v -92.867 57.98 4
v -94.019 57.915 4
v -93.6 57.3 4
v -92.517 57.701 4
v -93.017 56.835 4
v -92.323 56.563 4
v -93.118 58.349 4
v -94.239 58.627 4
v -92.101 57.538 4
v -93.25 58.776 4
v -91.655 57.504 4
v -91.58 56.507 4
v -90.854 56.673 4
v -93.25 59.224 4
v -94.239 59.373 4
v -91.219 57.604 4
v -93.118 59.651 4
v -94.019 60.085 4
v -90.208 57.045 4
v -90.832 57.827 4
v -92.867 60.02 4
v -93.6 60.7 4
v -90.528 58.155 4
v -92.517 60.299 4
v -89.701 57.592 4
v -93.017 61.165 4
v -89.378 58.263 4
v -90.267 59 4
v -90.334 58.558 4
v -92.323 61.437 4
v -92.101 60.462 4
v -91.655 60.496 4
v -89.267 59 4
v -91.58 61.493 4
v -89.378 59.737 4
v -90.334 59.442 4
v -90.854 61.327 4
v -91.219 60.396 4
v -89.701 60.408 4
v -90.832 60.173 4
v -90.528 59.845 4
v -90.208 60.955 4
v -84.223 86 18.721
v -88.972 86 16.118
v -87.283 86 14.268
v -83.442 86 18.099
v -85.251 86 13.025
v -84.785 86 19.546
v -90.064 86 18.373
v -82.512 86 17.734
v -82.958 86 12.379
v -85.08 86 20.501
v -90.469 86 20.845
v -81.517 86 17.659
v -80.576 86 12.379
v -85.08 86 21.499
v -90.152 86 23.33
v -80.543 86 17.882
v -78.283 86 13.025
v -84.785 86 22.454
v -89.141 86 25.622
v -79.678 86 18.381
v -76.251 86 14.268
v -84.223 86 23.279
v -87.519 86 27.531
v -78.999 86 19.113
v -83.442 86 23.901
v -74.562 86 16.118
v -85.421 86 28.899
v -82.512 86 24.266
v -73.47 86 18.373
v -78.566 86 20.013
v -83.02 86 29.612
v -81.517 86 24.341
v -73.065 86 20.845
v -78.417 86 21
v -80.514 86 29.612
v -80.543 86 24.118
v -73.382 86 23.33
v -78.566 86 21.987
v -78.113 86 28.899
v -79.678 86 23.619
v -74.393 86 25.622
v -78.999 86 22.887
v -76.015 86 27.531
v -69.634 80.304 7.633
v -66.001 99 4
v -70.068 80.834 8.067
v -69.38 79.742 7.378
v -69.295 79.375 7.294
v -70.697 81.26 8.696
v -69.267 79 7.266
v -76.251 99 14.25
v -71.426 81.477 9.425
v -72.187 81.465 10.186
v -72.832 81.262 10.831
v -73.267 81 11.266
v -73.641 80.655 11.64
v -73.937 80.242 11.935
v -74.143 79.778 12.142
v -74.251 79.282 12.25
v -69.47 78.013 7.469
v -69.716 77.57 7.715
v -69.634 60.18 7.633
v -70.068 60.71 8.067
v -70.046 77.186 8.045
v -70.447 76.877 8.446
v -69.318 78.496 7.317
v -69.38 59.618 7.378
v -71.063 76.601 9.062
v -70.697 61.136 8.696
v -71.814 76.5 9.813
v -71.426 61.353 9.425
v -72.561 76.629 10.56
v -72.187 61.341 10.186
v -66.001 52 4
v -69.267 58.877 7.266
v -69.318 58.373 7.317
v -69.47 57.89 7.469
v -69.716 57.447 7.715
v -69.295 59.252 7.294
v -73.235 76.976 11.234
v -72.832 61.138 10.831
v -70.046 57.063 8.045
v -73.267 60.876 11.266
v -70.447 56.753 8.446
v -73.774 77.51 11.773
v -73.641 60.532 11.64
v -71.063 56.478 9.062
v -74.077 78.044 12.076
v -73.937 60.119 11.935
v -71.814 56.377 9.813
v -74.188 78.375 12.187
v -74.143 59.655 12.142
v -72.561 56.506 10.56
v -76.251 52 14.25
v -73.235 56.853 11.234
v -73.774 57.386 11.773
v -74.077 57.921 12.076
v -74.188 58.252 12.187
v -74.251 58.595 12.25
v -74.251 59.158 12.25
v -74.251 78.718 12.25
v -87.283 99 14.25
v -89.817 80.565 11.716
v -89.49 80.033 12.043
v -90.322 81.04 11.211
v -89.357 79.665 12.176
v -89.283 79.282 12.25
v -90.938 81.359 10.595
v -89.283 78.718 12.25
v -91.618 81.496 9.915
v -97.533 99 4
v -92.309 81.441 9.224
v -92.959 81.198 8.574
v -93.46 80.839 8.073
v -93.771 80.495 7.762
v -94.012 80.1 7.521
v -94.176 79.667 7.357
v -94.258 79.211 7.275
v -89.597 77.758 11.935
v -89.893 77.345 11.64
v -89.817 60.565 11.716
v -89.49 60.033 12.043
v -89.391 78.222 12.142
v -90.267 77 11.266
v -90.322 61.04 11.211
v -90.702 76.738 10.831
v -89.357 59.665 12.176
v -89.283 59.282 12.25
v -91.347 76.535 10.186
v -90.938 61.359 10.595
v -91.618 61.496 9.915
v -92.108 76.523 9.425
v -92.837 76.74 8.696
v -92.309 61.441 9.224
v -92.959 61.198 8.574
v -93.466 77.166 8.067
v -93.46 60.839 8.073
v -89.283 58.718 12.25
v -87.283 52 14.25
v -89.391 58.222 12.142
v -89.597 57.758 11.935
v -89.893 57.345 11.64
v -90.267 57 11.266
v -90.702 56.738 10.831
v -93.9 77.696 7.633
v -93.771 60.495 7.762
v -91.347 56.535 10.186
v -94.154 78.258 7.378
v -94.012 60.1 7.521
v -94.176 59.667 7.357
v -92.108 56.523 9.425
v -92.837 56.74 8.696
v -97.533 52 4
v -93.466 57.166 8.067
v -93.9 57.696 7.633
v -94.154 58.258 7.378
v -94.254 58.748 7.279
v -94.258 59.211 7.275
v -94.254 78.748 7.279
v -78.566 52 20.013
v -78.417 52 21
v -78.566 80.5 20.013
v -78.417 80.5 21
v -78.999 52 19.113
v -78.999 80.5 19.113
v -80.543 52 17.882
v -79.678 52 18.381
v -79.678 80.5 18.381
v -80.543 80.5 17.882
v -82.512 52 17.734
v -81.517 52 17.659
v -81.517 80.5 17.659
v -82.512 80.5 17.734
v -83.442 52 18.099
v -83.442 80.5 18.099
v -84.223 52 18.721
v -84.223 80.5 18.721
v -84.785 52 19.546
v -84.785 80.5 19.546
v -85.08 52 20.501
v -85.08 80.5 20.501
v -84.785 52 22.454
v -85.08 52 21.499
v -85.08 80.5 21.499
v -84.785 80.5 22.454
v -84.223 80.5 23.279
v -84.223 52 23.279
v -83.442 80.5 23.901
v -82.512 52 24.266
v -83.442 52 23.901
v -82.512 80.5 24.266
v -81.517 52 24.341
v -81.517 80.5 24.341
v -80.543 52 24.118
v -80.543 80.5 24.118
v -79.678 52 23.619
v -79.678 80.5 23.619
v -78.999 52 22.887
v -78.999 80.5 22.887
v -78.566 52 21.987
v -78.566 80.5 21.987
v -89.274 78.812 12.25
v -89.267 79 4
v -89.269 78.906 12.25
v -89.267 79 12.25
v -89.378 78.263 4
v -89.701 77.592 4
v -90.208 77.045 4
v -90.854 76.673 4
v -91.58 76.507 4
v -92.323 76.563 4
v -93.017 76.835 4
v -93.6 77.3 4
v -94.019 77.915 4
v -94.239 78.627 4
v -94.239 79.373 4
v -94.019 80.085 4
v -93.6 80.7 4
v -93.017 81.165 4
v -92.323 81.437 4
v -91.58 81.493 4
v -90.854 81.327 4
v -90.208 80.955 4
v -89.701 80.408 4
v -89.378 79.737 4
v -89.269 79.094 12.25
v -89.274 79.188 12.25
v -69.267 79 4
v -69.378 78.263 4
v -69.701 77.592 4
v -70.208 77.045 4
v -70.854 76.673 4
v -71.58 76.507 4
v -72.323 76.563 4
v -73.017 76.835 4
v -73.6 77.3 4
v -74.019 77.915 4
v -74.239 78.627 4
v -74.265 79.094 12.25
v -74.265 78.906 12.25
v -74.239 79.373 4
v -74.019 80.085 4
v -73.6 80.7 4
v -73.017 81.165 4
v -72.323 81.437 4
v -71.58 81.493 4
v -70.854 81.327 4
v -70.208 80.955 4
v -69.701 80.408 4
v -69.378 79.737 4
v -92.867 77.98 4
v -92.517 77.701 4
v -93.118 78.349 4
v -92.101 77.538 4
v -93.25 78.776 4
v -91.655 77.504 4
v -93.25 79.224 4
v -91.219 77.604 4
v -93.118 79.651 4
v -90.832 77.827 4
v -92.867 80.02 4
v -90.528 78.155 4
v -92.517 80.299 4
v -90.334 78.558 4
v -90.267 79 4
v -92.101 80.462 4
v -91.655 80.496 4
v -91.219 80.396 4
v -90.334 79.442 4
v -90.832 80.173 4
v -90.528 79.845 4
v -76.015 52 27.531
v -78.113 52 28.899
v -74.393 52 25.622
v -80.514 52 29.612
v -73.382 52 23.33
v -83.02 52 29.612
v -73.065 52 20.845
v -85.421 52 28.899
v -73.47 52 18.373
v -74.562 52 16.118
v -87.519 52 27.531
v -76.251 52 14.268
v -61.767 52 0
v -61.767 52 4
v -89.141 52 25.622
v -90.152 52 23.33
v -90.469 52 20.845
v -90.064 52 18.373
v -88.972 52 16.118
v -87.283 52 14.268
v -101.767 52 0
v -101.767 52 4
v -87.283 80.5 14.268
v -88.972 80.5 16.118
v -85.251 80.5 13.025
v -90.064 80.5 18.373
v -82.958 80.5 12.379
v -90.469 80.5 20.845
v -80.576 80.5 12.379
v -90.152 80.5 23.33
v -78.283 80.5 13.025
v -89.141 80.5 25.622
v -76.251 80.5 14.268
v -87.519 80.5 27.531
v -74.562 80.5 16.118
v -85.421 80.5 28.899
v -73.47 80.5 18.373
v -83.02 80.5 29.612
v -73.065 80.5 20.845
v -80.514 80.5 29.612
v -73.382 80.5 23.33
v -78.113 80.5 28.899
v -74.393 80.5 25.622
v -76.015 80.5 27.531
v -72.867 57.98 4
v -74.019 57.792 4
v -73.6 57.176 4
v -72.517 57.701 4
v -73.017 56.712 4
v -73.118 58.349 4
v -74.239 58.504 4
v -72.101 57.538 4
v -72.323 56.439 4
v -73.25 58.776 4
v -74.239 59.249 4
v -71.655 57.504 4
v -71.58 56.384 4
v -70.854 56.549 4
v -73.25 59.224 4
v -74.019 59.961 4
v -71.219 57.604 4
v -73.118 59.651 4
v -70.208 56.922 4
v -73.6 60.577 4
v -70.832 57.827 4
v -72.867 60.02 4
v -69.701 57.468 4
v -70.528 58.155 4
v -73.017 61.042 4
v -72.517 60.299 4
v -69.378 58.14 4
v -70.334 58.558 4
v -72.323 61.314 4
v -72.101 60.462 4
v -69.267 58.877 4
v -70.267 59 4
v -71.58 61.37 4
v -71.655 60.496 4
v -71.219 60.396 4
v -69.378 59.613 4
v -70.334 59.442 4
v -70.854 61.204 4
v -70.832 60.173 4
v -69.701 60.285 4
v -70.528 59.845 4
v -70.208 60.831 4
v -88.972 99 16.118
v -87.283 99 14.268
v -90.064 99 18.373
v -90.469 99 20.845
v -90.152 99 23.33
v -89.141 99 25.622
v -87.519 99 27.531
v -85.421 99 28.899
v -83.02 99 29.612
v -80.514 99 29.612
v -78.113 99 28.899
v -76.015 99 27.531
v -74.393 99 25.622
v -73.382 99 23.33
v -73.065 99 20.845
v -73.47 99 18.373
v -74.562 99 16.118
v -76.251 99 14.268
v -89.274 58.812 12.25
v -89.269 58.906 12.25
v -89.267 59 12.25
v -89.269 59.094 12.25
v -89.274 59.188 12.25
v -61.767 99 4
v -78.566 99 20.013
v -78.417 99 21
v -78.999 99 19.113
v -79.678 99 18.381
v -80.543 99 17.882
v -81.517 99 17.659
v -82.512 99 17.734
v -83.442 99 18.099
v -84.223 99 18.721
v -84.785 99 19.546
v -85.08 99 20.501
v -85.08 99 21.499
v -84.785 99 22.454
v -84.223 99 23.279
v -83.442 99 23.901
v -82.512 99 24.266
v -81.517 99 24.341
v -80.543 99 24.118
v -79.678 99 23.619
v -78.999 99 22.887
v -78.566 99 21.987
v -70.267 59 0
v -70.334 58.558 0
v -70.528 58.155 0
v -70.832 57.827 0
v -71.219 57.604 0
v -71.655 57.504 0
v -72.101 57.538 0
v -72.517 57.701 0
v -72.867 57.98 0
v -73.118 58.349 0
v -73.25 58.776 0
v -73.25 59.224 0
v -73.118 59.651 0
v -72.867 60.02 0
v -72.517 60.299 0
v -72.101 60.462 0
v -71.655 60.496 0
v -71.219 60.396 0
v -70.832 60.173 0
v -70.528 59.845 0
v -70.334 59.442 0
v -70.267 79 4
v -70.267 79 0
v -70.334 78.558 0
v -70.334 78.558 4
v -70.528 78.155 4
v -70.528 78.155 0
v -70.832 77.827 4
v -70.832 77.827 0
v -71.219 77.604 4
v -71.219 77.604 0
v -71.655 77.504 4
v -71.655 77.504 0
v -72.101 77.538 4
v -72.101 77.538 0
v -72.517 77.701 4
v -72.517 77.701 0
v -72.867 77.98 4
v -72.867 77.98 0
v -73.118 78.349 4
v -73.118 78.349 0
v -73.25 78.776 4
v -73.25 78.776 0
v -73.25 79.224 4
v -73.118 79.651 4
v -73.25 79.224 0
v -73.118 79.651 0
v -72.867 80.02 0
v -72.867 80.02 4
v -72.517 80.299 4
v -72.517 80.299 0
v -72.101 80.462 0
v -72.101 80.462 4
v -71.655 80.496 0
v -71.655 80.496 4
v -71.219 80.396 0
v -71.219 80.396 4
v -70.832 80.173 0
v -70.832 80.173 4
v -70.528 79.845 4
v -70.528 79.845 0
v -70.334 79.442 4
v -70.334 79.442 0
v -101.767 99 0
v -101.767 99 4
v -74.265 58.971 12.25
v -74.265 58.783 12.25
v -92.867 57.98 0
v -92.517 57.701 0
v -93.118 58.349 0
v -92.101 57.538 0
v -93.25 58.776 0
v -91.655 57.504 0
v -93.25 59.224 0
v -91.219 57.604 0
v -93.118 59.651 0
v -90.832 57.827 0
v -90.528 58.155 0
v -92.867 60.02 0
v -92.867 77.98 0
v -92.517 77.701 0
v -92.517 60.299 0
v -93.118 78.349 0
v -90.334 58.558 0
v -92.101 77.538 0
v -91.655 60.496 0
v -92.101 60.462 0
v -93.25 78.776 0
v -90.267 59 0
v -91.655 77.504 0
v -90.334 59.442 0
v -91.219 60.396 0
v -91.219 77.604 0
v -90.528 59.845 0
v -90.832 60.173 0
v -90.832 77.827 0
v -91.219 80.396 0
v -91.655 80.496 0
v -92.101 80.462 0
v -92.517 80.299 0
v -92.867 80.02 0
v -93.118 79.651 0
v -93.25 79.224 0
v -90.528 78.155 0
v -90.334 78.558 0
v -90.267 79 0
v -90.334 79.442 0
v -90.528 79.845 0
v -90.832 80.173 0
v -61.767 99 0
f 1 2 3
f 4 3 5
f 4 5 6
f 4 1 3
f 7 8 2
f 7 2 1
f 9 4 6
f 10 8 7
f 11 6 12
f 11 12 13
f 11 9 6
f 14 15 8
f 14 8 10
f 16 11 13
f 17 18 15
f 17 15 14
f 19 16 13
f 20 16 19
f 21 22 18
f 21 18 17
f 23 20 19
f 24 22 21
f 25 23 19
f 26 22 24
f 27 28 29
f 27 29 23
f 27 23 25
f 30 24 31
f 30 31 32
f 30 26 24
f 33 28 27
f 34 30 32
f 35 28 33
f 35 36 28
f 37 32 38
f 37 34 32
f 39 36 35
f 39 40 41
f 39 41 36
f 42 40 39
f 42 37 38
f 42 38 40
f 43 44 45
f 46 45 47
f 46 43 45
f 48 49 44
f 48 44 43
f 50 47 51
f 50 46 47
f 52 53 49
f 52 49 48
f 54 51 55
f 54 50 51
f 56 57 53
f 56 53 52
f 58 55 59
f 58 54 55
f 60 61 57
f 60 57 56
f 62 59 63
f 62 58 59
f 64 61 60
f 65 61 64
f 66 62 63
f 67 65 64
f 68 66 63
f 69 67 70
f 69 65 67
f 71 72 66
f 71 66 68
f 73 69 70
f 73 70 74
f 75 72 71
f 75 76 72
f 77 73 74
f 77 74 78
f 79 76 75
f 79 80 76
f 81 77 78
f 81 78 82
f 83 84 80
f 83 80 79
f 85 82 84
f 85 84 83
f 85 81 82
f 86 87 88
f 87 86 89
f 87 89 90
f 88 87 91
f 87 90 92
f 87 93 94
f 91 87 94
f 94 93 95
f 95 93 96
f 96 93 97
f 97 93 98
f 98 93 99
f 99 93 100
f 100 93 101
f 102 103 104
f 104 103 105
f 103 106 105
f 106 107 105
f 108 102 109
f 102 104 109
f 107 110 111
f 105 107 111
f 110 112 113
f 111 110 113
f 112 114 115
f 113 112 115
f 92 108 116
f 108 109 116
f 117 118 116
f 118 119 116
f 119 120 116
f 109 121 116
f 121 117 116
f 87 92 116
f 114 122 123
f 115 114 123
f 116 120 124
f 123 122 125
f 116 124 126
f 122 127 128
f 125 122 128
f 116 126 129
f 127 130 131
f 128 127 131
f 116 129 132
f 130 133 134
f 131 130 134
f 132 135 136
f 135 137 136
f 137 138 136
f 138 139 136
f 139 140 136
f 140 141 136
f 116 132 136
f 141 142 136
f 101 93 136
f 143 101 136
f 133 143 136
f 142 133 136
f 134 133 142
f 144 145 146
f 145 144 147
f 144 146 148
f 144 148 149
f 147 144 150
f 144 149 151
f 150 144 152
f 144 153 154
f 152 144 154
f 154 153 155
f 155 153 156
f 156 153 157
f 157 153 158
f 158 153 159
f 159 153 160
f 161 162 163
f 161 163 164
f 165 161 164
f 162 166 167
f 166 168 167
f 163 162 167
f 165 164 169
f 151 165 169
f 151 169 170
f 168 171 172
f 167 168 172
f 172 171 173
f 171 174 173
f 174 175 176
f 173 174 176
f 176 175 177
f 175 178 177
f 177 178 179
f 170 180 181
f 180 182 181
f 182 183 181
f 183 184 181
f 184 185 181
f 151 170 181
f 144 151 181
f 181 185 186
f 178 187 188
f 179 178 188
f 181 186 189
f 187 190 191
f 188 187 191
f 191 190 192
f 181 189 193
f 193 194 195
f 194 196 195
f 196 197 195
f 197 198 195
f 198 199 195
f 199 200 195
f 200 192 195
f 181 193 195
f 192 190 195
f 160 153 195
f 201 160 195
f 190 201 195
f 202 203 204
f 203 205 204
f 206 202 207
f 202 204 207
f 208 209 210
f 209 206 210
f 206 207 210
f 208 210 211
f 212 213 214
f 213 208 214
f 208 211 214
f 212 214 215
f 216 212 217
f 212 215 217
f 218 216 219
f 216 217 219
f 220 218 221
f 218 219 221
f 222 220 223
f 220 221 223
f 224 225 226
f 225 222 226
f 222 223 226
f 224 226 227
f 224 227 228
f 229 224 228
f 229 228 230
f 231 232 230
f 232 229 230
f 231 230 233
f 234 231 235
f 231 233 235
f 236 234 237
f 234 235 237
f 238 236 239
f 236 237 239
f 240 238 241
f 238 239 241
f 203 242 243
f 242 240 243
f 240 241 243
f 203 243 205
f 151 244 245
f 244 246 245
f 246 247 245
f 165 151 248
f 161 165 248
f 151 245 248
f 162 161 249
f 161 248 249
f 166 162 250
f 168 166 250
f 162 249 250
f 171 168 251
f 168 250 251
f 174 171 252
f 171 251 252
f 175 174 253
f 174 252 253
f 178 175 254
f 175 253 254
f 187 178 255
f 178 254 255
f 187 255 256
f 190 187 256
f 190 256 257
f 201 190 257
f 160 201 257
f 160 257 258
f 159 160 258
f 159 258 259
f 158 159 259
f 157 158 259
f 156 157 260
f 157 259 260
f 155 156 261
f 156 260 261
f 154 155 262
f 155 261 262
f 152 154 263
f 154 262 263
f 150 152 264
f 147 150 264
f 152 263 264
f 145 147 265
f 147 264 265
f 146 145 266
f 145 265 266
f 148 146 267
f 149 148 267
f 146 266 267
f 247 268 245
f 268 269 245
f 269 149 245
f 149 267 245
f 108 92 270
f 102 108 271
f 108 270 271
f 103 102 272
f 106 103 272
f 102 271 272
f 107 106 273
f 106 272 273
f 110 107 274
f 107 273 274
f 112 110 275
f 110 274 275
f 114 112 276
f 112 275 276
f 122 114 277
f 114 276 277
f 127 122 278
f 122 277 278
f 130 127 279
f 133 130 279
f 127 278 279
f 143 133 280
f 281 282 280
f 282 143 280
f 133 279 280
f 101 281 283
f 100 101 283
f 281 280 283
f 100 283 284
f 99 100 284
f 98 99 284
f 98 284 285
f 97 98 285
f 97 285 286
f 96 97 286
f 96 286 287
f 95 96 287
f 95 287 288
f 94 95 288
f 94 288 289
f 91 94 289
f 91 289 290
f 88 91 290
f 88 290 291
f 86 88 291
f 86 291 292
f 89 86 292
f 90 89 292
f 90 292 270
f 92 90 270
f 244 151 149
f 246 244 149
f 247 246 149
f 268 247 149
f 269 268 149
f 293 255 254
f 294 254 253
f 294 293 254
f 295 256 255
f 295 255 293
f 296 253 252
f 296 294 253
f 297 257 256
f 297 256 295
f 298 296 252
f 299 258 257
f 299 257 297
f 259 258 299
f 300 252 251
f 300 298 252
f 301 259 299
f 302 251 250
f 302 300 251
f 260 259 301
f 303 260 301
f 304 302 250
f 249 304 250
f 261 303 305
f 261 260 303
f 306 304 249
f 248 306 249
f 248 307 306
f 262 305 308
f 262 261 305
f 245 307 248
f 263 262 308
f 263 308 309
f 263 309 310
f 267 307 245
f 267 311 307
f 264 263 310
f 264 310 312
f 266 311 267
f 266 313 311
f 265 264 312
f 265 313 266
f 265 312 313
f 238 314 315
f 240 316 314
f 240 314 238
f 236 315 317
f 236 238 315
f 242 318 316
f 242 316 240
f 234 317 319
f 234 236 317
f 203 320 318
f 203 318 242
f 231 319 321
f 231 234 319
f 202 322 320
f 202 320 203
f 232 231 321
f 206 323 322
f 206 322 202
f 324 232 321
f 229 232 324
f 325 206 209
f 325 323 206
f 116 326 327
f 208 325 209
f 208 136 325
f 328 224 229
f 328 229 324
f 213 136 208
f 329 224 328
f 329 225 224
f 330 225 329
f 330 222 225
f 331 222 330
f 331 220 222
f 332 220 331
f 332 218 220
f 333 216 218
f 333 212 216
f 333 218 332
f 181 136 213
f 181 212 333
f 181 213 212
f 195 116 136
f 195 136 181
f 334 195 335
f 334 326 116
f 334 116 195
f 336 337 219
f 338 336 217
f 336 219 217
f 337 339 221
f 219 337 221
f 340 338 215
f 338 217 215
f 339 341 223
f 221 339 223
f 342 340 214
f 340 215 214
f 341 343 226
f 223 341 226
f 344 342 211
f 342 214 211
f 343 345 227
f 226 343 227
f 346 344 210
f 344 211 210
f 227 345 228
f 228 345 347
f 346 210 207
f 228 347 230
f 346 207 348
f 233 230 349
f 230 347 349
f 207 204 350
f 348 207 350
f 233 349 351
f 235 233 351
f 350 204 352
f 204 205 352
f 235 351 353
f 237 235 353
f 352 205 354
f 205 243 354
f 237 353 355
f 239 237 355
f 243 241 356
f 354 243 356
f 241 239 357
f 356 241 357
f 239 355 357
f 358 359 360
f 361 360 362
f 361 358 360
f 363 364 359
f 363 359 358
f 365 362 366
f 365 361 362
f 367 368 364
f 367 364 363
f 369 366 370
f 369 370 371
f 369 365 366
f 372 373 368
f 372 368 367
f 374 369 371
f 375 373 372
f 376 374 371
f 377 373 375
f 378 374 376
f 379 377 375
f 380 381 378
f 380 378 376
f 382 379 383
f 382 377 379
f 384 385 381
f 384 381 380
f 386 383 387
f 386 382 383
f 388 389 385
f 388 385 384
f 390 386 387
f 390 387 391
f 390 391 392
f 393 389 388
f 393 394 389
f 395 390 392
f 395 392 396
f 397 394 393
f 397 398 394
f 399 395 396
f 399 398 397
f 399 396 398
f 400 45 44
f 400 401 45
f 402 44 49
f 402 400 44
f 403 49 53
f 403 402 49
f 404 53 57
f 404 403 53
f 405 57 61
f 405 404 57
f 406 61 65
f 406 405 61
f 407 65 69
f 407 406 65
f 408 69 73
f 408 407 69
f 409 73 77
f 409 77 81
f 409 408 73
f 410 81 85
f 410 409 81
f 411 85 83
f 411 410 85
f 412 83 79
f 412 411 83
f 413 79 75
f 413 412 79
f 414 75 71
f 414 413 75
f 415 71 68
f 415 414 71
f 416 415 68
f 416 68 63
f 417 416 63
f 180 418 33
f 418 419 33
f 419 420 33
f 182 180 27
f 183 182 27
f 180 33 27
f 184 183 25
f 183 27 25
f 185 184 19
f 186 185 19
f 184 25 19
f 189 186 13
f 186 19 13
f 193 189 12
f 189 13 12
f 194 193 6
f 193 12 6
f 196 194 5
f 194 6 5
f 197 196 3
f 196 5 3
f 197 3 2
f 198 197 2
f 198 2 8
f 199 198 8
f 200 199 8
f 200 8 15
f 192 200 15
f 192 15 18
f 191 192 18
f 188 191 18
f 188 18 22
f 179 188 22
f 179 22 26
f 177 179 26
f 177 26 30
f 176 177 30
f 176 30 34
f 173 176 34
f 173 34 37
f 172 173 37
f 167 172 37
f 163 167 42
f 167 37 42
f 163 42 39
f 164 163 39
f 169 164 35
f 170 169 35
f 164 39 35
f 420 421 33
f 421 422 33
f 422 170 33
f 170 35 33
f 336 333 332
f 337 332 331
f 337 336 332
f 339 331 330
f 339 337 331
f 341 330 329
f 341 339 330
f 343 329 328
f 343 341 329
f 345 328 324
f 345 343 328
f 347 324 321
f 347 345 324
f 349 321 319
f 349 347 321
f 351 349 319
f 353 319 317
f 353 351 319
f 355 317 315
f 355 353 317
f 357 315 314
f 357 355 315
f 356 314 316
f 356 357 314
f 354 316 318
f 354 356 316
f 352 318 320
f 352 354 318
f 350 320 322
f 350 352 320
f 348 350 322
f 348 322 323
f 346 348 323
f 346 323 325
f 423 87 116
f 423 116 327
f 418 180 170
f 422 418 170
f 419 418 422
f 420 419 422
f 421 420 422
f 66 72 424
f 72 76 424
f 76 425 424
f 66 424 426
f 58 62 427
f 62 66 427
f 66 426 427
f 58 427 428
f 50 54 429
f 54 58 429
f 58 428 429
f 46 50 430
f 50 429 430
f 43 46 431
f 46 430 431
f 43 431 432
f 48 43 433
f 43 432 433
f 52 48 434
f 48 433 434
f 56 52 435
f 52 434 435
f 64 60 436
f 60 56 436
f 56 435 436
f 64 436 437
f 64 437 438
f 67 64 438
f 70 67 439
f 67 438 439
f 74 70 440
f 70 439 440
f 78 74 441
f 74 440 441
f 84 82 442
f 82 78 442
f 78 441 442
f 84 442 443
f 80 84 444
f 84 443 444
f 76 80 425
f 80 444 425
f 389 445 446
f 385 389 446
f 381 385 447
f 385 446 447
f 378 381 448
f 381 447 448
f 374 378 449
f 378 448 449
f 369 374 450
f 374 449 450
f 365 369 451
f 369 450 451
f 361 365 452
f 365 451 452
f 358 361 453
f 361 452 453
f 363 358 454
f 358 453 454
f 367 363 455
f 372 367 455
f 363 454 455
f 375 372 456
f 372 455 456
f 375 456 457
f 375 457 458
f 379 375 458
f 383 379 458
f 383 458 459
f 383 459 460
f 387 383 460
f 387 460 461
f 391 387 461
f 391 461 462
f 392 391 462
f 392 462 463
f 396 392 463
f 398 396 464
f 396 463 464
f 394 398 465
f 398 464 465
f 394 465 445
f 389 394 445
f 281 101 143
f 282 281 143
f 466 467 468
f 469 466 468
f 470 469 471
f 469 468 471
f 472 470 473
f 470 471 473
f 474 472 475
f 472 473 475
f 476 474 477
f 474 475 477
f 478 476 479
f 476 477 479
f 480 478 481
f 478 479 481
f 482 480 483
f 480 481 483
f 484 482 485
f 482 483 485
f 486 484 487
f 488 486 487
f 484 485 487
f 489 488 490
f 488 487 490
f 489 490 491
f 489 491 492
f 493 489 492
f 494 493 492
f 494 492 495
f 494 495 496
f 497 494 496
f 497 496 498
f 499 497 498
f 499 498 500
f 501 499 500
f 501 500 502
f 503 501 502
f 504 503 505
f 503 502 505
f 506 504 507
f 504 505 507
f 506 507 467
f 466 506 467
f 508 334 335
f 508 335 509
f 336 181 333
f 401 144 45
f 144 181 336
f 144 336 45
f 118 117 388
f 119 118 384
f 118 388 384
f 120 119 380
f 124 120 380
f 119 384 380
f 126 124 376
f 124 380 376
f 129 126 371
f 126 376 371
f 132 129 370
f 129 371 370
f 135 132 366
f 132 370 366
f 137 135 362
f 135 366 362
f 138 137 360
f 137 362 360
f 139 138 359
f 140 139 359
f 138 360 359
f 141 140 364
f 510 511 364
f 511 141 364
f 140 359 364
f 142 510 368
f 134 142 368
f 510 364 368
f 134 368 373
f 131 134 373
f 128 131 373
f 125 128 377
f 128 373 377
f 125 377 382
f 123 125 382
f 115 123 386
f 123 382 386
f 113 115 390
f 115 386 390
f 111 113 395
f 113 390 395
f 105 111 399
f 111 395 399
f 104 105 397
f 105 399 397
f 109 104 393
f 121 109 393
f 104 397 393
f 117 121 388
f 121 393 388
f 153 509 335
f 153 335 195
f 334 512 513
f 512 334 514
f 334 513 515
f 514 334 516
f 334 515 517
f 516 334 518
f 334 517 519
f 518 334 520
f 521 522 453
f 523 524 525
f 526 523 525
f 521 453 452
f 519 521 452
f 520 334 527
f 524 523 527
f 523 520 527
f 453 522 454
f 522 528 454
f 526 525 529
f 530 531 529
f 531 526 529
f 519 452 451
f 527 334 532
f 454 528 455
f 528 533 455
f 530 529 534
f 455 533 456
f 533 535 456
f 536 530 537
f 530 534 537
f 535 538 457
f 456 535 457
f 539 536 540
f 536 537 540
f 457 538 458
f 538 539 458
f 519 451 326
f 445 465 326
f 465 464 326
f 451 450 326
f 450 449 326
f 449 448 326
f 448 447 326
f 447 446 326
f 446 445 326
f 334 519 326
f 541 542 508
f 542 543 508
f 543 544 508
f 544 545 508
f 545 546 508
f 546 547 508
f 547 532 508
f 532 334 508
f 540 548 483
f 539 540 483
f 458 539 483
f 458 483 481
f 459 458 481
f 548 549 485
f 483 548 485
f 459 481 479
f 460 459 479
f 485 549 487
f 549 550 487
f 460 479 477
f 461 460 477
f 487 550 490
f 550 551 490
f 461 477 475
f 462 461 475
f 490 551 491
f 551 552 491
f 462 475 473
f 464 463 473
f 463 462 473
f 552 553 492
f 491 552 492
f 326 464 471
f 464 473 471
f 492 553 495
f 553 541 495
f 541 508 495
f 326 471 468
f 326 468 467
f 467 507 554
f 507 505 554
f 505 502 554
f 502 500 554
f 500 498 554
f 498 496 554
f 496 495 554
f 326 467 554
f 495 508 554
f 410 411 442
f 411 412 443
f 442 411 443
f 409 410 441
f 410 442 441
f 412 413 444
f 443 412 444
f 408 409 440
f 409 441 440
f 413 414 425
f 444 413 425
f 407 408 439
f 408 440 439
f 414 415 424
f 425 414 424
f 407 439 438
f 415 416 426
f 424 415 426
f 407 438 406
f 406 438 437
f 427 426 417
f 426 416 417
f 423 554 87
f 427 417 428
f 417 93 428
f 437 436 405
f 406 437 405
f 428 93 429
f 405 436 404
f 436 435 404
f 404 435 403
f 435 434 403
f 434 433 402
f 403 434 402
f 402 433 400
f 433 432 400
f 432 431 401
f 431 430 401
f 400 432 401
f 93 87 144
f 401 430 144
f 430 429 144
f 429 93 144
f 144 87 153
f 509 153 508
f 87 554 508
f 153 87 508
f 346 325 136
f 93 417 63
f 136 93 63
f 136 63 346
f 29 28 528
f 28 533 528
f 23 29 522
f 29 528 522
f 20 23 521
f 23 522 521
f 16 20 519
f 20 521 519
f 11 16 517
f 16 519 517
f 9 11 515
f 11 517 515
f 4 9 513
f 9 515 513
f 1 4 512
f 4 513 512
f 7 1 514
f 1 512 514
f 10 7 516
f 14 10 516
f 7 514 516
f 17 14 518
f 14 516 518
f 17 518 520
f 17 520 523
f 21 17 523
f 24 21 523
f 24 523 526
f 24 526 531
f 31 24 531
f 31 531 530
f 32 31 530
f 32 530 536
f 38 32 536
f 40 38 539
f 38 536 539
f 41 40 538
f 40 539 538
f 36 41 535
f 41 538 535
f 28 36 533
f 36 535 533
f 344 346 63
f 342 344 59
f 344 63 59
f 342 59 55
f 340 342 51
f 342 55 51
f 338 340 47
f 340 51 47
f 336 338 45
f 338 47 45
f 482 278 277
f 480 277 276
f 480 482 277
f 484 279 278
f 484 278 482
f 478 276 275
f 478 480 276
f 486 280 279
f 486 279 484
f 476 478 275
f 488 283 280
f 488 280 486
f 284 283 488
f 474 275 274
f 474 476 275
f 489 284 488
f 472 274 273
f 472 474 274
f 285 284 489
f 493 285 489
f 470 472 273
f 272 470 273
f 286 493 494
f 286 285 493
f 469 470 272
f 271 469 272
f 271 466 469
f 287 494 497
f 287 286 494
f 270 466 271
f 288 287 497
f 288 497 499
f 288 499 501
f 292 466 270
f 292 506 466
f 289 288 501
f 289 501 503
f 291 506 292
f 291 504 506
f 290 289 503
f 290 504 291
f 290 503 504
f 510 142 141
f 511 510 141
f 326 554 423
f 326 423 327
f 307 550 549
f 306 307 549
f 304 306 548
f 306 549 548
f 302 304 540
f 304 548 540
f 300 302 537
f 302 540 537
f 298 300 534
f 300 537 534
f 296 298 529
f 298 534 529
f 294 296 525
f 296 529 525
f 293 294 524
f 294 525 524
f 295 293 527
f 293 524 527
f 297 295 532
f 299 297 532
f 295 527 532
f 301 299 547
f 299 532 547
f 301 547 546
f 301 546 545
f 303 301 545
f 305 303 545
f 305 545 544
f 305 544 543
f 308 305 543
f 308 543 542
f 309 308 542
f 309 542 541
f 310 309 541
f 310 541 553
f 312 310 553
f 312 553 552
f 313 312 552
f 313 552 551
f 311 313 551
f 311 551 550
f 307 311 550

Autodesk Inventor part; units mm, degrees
ref_plane "YZ Plane" through (0, 0, 0) normal (1, 0, 0) x (0, 1, 0)
ref_plane "XZ Plane" through (0, 0, 0) normal (0, 1, 0) x (-1, 0, 0)
ref_plane "XY Plane" through (0, 0, 0) normal (0, 0, 1) x (1, 0, 0)
sketch "Эскиз1" plane through (0, 0, 0) normal (0, 0, 1) x (1, 0, 0)
  line L0 (-76.034, 99) -> (-125.034, 99) projected
  line L1 (-56.034, 99) -> (-73.034, 99) projected
  circle A0 centre (-71.767, -79) radius 1.5 projected
  circle A1 centre (-91.767, -59) radius 1.5 projected
  circle A2 centre (-91.767, -79) radius 1.5 projected
  circle A3 centre (-71.767, -59) radius 1.5 projected
  circle A4 centre (-71.767, 79) radius 1.5 projected
  circle A5 centre (-71.767, 59) radius 1.5 projected
  circle A6 centre (-91.767, 79) radius 1.5 projected
  circle A7 centre (-91.767, 59) radius 1.5 projected
  circle A8 centre (35, -102) radius 1.5 projected
  circle A9 centre (-35, 102) radius 1.5 projected
  circle A10 centre (-35, -102) radius 1.5 projected
  circle A11 centre (35, 102) radius 1.5 projected
  line L2 (15, -105) -> (55, -105) projected
  line L3 (55, -105) -> (55, -99) projected
  line L4 (55, -99) -> (85, -99) projected
  line L5 (85, -99) -> (85, -105) projected
  line L6 (85, -105) -> (115, -105) projected
  line L7 (115, -105) -> (115, 105) projected
  line L8 (115, 105) -> (85, 105) projected
  line L9 (85, 105) -> (85, 99) projected
  line L10 (85, 99) -> (55, 99) projected
  line L11 (55, 99) -> (55, 105) projected
  line L12 (55, 105) -> (15, 105) projected
  line L13 (15, 105) -> (15, 99) projected
  line L14 (15, 99) -> (-15, 99) projected
  line L15 (-15, 99) -> (-15, 105) projected
  line L16 (-15, 105) -> (-55, 105) projected
  line L17 (-55, 105) -> (-55, 99) projected
  line L18 (-55, 99) -> (-85, 99) projected
  line L19 (-85, 99) -> (-85, 105) projected
  line L20 (-85, 105) -> (-115, 105) projected
  line L21 (-115, 105) -> (-115, 65) projected
  line L22 (-115, 65) -> (-109, 65) projected
  line L23 (-109, 65) -> (-109, 35) projected
  line L24 (-109, 35) -> (-115, 35) projected
  line L25 (-115, 35) -> (-115, -35) projected
  line L26 (-115, -35) -> (-109, -35) projected
  line L27 (-109, -35) -> (-109, -65) projected
  line L28 (-109, -65) -> (-115, -65) projected
  line L29 (-115, -65) -> (-115, -105) projected
  line L30 (-115, -105) -> (-85, -105) projected
  line L31 (-85, -105) -> (-85, -99) projected
  line L32 (-85, -99) -> (-55, -99) projected
  line L33 (-55, -99) -> (-55, -105) projected
  line L34 (-55, -105) -> (-15, -105) projected
  line L35 (-15, -105) -> (-15, -99) projected
  line L36 (-15, -99) -> (15, -99) projected
  line L37 (15, -99) -> (15, -105) projected
  line L38 (-61.767, 52) -> (-101.767, 52)
  line L39 (-101.767, 52) -> (-101.767, 99)
  line L40 (-101.767, 99) -> (-61.767, 99)
  line L41 (-61.767, 99) -> (-61.767, 52)
  line L42 (-101.767, 99) -> (-61.767, 99)
  line L43 (-61.767, 99) -> (-61.767, 95)
  line L44 (-61.767, 95) -> (-101.767, 95)
  line L45 (-101.767, 95) -> (-101.767, 99)
  line L46 (-61.767, 90) -> (-101.767, 90)
  line L47 (-101.767, 90) -> (-101.767, 86)
  line L48 (-101.767, 86) -> (-61.767, 86)
  line L49 (-61.767, 86) -> (-61.767, 90)
  point P0 (0, 0)
  dimension "d0" = 10
  dimension "d1" = 10
  dimension "d2" = 7
  dimension "d3" = 4
  dimension "d4" = 5
  dimension "d5" = 4
extrude "Выдавливание1" add sketch "Эскиз1" along normal blind 4 contours L18 L1 L41 L44 L39 L0 | L44 L41 L46 L39 | L46 L41 L48 L39 | L48 L41 L38 L39 | A4 | A5 | A6 | A7
ref_plane "РабПлоскость1" through (-101.767, 86, 28) normal (0, -1, 0) x (1, 0, 0)
sketch "Эскиз2" plane through (-101.767, 86, 28) normal (0, -1, 0) x (1, 0, 0)
  circle A0 centre (20, -7) radius 3.35
  line L0 (0, -28) -> (40, -28) projected
  line L1 (0, -20) -> (0, 0) projected
  line L2 (14.4841, -22.5546) -> (14.4841, -13.7319)
  circle A1 centre (20, -7) radius 8.7031
  line L3 (25.5159, -13.7319) -> (25.5159, -22.5546)
  line L4 (14.4841, -22.5546) -> (14.4841, -24)
  line L5 (25.5159, -22.5546) -> (25.5159, -24)
  line L6 (25.5159, -24) -> (14.4841, -24)
  line L7 (0, -24) -> (40, -24) projected
  point P0 (101.767, -28)
  dimension "d17" = 6.7
  dimension "d18" = 21
  dimension "d19" = 20
extrude "Выдавливание3" add sketch "Эскиз2" along normal blind 34 and the other way blind 13
sketch "Эскиз3" plane through (-101.767, 86, 28) normal (0, -1, 0) x (1, 0, 0)
  circle A0 centre (20, -7) radius 3.35 projected
  circle A1 centre (20, -7) radius 8.7031
  point P0 (101.767, -28)
  point P1 (14.4841, -13.7319)
extrude "Выдавливание4" cut sketch "Эскиз3" along normal blind 5.5
chamfer "Фаска3" distance 10.25 angle 45 1 edges at (-76.251, 75.5, 4)
chamfer "Фаска4" distance 10.25 angle 45 1 edges at (-87.2829, 75.5, 4)
extrude "Выдавливание5" cut sketch "Эскиз1" along normal blind 17.75 contours A4 | A5 | A6 | A7
sketch "Эскиз4" plane through (0, 0, 4) normal (0, 0, 1) x (1, 0, 0)
  circle A0 centre (-71.767, 79) radius 1.5 projected
  circle A1 centre (-71.767, 79) radius 2.5
  circle A2 centre (-71.767, 58.8766) radius 2.5
  circle A3 centre (-91.767, 59) radius 1.5 projected
  circle A4 centre (-91.767, 59) radius 2.5
  circle A5 centre (-91.767, 79) radius 1.5 projected
  circle A6 centre (-91.767, 79) radius 2.5
  point P0 (0, 0)
  dimension "d34" = 5
  dimension "d35" = 5
  dimension "d36" = 5
  dimension "d37" = 5
extrude "Выдавливание6" cut sketch "Эскиз4" along normal blind 8.25 contours A0 | A1 | A2 | A3 | A4 | A5 | A6
properties part number "крепеж валика"
